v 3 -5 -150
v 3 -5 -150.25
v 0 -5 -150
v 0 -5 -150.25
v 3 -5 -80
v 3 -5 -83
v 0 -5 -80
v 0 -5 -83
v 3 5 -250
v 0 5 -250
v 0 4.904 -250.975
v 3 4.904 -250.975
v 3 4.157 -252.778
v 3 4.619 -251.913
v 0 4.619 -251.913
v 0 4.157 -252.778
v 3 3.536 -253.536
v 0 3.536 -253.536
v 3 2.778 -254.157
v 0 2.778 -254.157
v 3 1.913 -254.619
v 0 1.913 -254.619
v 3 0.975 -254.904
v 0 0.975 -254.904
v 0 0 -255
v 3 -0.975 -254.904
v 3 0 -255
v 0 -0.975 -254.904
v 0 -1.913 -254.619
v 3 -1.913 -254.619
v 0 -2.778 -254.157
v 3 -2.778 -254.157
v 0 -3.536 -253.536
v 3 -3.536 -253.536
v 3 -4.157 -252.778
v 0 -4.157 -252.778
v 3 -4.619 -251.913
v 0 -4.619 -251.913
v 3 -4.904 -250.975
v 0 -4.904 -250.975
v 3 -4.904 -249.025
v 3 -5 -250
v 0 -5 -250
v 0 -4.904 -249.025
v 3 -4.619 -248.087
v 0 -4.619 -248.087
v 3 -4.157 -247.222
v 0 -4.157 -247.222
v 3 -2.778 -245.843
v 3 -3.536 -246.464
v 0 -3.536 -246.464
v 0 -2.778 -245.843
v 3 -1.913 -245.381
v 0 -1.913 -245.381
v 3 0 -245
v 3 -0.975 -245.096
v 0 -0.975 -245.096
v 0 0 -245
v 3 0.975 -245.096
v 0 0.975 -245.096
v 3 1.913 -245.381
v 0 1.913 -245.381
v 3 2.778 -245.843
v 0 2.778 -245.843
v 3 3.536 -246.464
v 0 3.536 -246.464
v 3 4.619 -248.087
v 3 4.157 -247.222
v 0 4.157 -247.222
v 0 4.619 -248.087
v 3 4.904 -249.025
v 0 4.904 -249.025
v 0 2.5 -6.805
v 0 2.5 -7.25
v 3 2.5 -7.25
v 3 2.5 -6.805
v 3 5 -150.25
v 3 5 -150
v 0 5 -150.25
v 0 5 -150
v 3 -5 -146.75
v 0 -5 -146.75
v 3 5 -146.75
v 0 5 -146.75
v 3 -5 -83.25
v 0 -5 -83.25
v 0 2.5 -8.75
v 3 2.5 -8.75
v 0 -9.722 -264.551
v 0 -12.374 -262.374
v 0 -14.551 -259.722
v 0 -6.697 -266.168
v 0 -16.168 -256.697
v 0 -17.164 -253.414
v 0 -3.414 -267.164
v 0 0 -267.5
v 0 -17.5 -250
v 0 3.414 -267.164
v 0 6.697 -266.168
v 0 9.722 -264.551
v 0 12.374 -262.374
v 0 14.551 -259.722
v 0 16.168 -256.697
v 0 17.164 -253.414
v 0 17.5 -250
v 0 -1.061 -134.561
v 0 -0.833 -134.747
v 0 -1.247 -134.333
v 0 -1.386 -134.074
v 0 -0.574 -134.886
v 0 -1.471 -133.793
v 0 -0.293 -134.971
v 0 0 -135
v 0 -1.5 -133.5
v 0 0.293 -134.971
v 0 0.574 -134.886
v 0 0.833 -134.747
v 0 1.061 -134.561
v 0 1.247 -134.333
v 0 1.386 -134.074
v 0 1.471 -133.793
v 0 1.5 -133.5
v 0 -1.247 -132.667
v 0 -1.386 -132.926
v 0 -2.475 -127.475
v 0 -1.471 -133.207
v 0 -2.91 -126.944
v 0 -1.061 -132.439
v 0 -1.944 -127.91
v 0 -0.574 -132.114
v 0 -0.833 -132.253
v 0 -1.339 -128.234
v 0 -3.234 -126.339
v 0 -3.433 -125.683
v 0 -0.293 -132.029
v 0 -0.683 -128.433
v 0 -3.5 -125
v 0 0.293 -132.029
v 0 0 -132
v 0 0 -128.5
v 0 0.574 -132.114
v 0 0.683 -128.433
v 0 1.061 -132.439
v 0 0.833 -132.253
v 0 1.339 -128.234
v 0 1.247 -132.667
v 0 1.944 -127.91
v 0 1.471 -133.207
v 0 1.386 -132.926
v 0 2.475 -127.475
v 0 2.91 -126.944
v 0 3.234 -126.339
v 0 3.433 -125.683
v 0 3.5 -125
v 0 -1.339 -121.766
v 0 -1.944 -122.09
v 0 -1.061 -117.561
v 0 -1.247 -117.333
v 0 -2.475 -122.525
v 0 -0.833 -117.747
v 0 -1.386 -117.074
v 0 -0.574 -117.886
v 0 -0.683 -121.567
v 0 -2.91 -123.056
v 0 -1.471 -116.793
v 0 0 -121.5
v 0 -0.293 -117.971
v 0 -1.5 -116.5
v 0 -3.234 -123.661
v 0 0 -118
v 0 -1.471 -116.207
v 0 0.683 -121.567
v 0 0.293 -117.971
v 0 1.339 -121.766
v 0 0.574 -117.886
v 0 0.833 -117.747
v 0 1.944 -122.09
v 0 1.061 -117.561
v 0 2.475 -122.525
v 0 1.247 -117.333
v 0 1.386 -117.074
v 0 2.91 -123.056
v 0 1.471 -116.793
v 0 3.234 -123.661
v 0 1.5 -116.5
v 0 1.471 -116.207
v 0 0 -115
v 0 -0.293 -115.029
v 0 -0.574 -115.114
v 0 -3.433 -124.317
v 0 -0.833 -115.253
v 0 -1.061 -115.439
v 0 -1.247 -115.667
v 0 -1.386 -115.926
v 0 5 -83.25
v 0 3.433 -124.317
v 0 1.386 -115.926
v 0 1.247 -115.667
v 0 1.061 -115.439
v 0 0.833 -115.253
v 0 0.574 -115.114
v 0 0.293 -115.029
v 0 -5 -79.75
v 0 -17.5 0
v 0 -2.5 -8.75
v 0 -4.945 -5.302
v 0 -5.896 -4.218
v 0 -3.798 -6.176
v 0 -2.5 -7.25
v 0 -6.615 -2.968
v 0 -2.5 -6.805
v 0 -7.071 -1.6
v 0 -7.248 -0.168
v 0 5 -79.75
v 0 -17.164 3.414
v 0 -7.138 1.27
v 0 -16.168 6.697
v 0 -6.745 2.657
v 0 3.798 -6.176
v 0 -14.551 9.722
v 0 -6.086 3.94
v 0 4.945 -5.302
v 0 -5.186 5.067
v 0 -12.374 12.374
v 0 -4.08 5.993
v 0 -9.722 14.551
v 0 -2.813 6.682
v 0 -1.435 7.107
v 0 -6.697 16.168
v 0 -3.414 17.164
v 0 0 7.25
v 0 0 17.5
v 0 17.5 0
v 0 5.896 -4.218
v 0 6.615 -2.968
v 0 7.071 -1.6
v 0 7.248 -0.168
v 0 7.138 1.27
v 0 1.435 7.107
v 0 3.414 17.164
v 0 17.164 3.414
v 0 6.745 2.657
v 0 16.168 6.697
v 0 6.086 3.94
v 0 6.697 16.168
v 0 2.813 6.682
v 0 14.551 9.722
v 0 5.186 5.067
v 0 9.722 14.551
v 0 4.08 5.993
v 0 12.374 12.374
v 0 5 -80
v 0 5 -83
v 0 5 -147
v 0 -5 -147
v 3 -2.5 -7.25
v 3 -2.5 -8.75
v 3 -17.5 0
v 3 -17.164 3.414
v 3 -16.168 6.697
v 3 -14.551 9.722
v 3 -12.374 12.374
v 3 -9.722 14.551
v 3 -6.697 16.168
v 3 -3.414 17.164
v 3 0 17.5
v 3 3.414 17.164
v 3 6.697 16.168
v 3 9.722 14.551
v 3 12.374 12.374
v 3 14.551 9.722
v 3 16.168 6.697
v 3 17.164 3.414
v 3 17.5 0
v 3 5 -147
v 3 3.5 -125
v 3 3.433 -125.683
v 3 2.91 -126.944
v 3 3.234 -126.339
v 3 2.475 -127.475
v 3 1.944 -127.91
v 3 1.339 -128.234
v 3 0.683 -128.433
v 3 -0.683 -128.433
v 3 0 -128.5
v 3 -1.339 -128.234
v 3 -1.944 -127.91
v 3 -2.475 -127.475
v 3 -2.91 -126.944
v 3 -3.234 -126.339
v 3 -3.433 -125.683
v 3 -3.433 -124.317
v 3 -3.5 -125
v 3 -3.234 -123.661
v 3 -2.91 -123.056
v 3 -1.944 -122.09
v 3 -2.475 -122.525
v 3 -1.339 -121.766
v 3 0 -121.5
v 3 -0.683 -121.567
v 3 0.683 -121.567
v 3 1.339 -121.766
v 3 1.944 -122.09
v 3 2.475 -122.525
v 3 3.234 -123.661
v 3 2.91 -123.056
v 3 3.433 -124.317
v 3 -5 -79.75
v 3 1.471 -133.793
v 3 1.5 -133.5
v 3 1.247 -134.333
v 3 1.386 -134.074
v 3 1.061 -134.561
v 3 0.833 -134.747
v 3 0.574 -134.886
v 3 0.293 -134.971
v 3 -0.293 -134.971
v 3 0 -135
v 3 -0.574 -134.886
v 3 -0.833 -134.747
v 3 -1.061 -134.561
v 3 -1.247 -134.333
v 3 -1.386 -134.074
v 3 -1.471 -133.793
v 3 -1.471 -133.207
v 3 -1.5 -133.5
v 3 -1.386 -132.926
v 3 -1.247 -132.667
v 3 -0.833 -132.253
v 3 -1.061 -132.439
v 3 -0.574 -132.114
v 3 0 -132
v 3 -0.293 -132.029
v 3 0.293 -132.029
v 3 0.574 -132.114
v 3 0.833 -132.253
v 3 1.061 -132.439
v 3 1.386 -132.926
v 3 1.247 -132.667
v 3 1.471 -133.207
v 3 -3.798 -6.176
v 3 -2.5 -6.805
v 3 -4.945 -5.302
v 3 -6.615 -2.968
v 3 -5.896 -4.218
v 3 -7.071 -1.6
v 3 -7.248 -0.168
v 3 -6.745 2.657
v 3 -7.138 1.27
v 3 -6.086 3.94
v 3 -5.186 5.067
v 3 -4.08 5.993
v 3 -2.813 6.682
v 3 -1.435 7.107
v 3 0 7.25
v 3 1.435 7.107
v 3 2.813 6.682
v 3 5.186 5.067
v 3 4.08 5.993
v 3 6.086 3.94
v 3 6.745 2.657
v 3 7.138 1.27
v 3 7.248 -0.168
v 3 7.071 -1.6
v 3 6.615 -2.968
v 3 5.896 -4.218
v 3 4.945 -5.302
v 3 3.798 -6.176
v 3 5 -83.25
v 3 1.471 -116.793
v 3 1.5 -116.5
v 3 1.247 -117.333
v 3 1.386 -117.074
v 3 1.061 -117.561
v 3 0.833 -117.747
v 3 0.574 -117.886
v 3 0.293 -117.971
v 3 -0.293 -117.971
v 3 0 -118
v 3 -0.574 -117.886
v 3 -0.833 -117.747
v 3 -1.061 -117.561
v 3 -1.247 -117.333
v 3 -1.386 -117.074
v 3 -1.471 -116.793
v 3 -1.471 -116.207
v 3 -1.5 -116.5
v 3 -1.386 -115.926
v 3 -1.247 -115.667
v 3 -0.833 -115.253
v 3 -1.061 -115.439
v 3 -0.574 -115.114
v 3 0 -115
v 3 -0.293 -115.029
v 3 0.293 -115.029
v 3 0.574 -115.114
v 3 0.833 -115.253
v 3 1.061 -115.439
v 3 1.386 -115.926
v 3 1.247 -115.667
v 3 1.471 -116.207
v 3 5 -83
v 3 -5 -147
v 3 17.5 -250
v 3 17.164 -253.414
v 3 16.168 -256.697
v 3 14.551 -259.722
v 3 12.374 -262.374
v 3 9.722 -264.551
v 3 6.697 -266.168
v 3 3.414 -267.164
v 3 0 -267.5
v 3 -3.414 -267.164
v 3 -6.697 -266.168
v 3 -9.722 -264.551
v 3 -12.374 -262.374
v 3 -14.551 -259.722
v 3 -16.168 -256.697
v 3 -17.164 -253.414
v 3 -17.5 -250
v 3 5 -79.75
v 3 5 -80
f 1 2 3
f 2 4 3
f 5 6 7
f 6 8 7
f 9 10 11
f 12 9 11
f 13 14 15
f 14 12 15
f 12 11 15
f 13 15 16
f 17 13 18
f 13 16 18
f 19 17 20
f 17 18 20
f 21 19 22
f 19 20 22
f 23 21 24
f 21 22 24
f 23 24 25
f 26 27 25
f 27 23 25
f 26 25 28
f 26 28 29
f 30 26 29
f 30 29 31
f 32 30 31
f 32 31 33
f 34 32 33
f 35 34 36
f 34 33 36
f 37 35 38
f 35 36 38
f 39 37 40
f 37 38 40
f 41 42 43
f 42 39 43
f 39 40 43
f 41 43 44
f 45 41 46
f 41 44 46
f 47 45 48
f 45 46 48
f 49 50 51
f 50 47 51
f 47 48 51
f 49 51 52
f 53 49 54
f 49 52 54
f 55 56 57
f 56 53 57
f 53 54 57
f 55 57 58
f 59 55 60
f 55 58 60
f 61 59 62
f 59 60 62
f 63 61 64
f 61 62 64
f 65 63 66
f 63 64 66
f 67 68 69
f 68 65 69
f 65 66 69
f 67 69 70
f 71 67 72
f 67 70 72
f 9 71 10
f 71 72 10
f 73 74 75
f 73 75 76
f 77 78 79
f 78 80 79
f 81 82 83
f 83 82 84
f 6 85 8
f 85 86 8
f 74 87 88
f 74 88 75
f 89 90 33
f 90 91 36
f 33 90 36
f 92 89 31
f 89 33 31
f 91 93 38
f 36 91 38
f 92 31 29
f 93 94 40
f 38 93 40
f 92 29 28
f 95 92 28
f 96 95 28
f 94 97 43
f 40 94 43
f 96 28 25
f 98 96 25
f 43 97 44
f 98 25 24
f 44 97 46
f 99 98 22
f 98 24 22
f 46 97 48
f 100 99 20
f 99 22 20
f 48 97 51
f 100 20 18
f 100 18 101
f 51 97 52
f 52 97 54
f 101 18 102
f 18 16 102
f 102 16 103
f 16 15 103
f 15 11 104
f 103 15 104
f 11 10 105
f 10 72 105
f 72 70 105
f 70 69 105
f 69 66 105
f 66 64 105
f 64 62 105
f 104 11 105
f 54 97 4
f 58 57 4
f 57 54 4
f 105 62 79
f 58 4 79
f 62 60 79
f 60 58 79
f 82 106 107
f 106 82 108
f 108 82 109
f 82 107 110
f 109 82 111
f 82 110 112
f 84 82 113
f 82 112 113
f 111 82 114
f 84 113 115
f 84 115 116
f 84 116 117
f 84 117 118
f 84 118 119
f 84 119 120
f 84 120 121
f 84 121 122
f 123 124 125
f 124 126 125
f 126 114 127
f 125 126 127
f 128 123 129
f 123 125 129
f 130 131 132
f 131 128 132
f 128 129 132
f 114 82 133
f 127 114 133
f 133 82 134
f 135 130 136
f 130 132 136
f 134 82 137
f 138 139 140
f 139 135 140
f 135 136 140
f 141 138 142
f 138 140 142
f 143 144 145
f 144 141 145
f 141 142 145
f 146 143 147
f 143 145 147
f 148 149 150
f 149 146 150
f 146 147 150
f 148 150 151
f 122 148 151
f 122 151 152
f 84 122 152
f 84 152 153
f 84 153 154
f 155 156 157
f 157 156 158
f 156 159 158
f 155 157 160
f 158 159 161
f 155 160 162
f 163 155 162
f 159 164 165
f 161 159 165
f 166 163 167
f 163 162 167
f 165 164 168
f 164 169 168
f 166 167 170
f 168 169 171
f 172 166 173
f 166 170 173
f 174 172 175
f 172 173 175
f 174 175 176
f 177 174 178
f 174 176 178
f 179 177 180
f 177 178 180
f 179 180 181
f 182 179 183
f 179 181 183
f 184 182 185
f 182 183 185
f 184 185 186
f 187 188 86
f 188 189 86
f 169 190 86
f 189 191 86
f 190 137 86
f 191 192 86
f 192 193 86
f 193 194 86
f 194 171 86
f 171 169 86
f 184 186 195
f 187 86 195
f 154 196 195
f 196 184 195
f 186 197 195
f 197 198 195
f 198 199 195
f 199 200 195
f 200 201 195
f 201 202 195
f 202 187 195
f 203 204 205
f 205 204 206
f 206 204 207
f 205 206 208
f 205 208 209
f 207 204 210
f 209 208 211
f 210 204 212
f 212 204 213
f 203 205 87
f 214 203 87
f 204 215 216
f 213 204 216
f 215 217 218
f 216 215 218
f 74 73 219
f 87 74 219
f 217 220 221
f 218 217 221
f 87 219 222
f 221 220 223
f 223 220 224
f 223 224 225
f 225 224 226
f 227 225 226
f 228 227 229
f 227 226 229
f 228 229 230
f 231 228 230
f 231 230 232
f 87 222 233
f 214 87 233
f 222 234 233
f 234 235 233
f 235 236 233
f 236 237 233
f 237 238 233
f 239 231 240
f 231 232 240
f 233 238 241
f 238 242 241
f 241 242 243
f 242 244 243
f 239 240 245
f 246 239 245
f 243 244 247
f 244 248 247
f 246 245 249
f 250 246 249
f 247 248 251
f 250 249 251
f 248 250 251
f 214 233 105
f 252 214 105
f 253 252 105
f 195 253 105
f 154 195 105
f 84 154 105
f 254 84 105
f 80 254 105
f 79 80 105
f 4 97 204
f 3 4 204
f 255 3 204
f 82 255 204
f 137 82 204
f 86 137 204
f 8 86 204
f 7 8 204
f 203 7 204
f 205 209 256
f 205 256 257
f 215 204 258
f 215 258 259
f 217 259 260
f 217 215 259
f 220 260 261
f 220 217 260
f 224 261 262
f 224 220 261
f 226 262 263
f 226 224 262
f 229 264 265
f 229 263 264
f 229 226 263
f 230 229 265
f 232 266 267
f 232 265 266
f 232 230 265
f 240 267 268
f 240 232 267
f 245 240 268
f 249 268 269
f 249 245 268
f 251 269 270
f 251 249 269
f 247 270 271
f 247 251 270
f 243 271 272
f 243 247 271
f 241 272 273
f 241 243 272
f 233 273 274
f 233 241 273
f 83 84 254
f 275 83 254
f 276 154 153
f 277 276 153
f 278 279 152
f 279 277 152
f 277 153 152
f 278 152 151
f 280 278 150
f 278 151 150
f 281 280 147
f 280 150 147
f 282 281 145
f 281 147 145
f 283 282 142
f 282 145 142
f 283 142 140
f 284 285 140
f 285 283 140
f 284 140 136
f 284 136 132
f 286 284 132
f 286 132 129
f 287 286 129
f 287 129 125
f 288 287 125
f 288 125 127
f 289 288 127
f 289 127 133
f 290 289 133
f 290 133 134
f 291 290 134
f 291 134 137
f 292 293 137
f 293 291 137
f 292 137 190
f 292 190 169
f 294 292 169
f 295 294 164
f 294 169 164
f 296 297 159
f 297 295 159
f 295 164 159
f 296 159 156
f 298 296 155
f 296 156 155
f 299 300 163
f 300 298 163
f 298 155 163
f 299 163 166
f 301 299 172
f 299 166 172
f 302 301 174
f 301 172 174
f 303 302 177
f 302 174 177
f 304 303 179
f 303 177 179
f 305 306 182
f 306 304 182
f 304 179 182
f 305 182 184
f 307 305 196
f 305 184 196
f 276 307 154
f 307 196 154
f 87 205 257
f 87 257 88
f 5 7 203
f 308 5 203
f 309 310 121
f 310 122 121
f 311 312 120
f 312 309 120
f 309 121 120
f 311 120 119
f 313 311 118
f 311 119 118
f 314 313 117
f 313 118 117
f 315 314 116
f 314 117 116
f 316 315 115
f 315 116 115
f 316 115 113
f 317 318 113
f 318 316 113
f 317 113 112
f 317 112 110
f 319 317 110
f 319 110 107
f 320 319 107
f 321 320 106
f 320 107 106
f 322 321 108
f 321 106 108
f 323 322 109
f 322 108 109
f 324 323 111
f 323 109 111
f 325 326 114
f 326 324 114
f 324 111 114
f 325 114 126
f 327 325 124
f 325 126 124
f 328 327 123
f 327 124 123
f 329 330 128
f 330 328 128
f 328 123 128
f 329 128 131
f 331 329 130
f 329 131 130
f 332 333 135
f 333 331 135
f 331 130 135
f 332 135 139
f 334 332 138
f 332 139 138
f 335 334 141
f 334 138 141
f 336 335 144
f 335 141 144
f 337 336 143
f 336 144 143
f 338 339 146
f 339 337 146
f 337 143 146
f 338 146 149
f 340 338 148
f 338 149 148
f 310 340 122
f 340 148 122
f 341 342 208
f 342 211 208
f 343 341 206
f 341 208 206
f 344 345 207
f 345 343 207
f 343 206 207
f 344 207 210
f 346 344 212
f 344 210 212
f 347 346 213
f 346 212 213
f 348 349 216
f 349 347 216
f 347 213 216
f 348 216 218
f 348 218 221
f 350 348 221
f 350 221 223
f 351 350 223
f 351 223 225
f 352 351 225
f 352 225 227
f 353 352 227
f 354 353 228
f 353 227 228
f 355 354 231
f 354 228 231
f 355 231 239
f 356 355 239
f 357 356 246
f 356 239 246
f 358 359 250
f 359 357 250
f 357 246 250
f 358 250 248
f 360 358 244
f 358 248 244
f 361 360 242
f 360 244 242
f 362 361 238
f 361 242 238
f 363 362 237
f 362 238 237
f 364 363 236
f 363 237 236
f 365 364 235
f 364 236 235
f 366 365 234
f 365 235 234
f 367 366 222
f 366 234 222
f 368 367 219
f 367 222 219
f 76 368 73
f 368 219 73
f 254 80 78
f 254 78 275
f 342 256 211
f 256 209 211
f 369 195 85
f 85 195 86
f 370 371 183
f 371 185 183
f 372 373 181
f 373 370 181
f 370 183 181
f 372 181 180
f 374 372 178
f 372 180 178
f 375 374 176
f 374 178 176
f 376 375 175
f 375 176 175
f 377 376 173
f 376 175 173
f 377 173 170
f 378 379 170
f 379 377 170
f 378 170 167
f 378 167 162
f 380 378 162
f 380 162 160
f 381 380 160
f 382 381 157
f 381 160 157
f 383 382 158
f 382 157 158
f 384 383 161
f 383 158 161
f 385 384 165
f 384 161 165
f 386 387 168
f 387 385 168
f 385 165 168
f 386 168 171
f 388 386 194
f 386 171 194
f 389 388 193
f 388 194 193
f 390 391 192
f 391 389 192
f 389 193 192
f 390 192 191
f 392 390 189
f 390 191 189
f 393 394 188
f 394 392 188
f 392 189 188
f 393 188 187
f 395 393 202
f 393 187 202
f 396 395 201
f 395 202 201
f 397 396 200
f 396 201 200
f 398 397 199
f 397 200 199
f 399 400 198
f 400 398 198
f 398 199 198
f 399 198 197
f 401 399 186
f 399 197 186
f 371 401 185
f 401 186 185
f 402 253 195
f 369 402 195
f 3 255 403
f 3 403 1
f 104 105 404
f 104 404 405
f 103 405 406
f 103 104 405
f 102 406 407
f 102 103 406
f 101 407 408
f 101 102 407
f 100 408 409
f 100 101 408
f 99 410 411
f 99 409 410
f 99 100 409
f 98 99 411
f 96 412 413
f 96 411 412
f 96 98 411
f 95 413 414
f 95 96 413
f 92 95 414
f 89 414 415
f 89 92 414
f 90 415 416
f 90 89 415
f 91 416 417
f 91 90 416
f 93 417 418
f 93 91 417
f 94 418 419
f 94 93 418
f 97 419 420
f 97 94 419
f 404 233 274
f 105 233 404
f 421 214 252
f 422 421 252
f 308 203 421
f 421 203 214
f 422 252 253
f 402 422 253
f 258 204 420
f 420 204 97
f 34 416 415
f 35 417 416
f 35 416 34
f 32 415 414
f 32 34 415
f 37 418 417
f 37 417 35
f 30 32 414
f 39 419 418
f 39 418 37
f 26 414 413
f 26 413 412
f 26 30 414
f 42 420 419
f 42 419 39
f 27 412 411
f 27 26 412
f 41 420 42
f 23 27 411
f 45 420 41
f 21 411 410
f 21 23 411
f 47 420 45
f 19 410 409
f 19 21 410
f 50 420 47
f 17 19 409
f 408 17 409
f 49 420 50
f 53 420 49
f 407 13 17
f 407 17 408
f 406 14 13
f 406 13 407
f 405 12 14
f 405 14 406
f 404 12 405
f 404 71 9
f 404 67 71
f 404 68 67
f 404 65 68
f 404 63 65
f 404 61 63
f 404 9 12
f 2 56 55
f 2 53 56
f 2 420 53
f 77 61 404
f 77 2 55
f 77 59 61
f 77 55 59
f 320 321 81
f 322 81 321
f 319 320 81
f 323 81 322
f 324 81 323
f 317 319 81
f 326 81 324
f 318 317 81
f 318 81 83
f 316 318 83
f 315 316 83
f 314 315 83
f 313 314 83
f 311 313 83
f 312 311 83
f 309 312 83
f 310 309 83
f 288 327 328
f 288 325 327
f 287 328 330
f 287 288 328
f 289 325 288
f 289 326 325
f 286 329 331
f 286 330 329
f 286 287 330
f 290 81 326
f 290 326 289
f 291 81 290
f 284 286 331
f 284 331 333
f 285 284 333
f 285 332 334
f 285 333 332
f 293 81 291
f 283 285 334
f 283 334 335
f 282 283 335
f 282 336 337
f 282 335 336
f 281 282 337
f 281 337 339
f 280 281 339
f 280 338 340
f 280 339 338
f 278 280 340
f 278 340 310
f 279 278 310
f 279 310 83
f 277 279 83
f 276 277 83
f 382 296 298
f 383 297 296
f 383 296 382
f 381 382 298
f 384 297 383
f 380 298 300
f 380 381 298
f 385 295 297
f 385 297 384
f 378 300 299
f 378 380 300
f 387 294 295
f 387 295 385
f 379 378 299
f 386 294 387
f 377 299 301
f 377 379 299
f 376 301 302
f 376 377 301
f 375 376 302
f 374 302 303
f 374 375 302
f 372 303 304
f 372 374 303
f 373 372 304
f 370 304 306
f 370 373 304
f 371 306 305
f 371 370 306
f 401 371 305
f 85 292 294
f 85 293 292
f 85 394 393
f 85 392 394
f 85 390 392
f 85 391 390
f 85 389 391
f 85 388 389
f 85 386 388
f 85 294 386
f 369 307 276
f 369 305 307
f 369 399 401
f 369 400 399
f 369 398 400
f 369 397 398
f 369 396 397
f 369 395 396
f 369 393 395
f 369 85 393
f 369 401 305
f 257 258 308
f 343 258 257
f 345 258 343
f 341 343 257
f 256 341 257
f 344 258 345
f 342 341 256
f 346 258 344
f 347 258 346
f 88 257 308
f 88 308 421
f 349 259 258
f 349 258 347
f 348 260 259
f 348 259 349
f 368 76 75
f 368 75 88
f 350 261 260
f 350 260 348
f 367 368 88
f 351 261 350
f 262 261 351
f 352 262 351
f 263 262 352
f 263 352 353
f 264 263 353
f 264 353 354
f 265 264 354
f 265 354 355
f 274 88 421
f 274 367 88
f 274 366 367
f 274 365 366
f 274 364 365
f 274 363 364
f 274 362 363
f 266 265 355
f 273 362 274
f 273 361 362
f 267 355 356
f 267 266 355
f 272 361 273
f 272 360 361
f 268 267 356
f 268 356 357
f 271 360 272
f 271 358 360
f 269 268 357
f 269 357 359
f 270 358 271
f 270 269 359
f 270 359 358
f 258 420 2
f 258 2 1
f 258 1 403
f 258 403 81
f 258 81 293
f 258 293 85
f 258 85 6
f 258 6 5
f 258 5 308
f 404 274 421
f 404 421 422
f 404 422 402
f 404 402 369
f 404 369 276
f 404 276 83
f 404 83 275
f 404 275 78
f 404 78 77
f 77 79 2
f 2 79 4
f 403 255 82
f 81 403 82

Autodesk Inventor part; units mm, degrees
ref_plane "YZ Plane" through (0, 0, 0) normal (1, 0, 0) x (0, 1, 0)
ref_plane "XZ Plane" through (0, 0, 0) normal (0, 1, 0) x (-1, 0, 0)
ref_plane "XY Plane" through (0, 0, 0) normal (0, 0, 1) x (1, 0, 0)
sketch "Sketch1" plane through (0, 0, 0) normal (1, 0, 0) x (0, 1, 0)
  line L0 (0, 0) -> (0, -250) construction
  circle A0 centre (0, -250) radius 5
  arc A1 (0, -17.5) -> (17.5, 0) centre (0, 0) ccw construction
  arc A2 (0, -232.5) -> (-17.5, -250) centre (0, -250) ccw construction
  line L1 (17.5, 0) -> (17.5, -250)
  line L2 (-17.5, 0) -> (-17.5, -250)
  arc A3 (-17.5, 0) -> (0, -17.5) centre (0, 0) ccw construction
  arc A4 (17.5, 0) -> (-17.5, 0) centre (0, 0) ccw
  arc A5 (17.5, -250) -> (0, -232.5) centre (0, -250) ccw construction
  arc A6 (-17.5, -250) -> (17.5, -250) centre (0, -250) ccw
  line L3 (0, 0) -> (0, -80) construction
  line L4 (0, -80) -> (5, -80) construction
  line L5 (5, -80) -> (5, -83)
  line L6 (5, -83) -> (-5, -83) construction
  line L7 (-5, -83) -> (-5, -80)
  line L8 (-5, -80) -> (0, -80) construction
  line L9 (0, -250) -> (0, -150) construction
  line L10 (0, -150) -> (5, -150) construction
  line L11 (5, -150) -> (5, -147)
  line L12 (5, -147) -> (-5, -147) construction
  line L13 (-5, -147) -> (-5, -150)
  line L14 (0, -150) -> (-5, -150) construction
  line L15 (0, -250) -> (0, -125) construction
  circle A7 centre (0, -125) radius 3.5
  line L16 (0, -125) -> (0, -133.5) construction
  line L17 (0, -125) -> (0, -116.5) construction
  circle A8 centre (0, -116.5) radius 1.5
  circle A9 centre (0, -133.5) radius 1.5
  line L18 (7.5, 0) -> (13.5, 0) construction
  arc A10 (2.5, -6.8053) -> (-2.5, -6.8053) centre (0, 0) ccw
  line L19 (0, -7.25) -> (2.5, -7.25) construction
  line L20 (2.5, -7.25) -> (-2.5, -7.25) construction
  line L21 (-2.5, -7.25) -> (-2.5, -8.75)
  line L22 (-2.5, -8.75) -> (2.5, -8.75)
  line L23 (2.5, -8.75) -> (2.5, -7.25)
  line L24 (2.5, -7.25) -> (2.5, -6.8053)
  line L25 (-2.5, -7.25) -> (-2.5, -6.8053)
  arc A11 (0, -7.25) -> (2.5, -6.8053) centre (0, 0) ccw construction
  arc A12 (-2.5, -6.8053) -> (0, -7.25) centre (0, 0) ccw construction
  line L26 (-5, -80) -> (-5, -79.75)
  line L27 (-5, -79.75) -> (5, -79.75)
  line L28 (5, -79.75) -> (5, -80)
  line L29 (5, -83) -> (5, -83.25)
  line L30 (5, -83.25) -> (-5, -83.25)
  line L31 (-5, -83.25) -> (-5, -83)
  line L32 (5, -150) -> (5, -150.25)
  line L33 (5, -150.25) -> (-5, -150.25)
  line L34 (-5, -150.25) -> (-5, -150)
  line L35 (-5, -147) -> (-5, -146.75)
  line L36 (-5, -146.75) -> (5, -146.75)
  line L37 (5, -146.75) -> (5, -147)
  dimension "d1" = 250
  dimension "d2" = 10
  dimension "d3" = 35
  dimension "d4" = 35
  dimension "d5" = 80
  dimension "d6" = 5
  dimension "d7" = 3
  dimension "d8" = 10
  dimension "d9" = 100
  dimension "d10" = 3
  dimension "d11" = 10
  dimension "d21" = 125
  dimension "d22" = 7
  dimension "d23" = 8.5
  dimension "d24" = 8.5
  dimension "d25" = 3
  dimension "d26" = 3
  dimension "d29" = 14.5
  dimension "d30" = 2.5
  dimension "d31" = 5
  dimension "d32" = 1.5
  dimension "d33" = 0.25
  dimension "d34" = 10
  dimension "d35" = 0.25
  dimension "d36" = 0.25
  dimension "d37" = 10
  dimension "d38" = 0.25
  dimension "d39" = 0.25
  dimension "d40" = 10
  dimension "d41" = 0.25
  dimension "d42" = 0.25
  dimension "d43" = 10
  dimension "d44" = 0.25
extrude "Extrusion1" add sketch "Sketch1" along normal blind 3
properties part number "brazo2" material "PMMA Plastic"
